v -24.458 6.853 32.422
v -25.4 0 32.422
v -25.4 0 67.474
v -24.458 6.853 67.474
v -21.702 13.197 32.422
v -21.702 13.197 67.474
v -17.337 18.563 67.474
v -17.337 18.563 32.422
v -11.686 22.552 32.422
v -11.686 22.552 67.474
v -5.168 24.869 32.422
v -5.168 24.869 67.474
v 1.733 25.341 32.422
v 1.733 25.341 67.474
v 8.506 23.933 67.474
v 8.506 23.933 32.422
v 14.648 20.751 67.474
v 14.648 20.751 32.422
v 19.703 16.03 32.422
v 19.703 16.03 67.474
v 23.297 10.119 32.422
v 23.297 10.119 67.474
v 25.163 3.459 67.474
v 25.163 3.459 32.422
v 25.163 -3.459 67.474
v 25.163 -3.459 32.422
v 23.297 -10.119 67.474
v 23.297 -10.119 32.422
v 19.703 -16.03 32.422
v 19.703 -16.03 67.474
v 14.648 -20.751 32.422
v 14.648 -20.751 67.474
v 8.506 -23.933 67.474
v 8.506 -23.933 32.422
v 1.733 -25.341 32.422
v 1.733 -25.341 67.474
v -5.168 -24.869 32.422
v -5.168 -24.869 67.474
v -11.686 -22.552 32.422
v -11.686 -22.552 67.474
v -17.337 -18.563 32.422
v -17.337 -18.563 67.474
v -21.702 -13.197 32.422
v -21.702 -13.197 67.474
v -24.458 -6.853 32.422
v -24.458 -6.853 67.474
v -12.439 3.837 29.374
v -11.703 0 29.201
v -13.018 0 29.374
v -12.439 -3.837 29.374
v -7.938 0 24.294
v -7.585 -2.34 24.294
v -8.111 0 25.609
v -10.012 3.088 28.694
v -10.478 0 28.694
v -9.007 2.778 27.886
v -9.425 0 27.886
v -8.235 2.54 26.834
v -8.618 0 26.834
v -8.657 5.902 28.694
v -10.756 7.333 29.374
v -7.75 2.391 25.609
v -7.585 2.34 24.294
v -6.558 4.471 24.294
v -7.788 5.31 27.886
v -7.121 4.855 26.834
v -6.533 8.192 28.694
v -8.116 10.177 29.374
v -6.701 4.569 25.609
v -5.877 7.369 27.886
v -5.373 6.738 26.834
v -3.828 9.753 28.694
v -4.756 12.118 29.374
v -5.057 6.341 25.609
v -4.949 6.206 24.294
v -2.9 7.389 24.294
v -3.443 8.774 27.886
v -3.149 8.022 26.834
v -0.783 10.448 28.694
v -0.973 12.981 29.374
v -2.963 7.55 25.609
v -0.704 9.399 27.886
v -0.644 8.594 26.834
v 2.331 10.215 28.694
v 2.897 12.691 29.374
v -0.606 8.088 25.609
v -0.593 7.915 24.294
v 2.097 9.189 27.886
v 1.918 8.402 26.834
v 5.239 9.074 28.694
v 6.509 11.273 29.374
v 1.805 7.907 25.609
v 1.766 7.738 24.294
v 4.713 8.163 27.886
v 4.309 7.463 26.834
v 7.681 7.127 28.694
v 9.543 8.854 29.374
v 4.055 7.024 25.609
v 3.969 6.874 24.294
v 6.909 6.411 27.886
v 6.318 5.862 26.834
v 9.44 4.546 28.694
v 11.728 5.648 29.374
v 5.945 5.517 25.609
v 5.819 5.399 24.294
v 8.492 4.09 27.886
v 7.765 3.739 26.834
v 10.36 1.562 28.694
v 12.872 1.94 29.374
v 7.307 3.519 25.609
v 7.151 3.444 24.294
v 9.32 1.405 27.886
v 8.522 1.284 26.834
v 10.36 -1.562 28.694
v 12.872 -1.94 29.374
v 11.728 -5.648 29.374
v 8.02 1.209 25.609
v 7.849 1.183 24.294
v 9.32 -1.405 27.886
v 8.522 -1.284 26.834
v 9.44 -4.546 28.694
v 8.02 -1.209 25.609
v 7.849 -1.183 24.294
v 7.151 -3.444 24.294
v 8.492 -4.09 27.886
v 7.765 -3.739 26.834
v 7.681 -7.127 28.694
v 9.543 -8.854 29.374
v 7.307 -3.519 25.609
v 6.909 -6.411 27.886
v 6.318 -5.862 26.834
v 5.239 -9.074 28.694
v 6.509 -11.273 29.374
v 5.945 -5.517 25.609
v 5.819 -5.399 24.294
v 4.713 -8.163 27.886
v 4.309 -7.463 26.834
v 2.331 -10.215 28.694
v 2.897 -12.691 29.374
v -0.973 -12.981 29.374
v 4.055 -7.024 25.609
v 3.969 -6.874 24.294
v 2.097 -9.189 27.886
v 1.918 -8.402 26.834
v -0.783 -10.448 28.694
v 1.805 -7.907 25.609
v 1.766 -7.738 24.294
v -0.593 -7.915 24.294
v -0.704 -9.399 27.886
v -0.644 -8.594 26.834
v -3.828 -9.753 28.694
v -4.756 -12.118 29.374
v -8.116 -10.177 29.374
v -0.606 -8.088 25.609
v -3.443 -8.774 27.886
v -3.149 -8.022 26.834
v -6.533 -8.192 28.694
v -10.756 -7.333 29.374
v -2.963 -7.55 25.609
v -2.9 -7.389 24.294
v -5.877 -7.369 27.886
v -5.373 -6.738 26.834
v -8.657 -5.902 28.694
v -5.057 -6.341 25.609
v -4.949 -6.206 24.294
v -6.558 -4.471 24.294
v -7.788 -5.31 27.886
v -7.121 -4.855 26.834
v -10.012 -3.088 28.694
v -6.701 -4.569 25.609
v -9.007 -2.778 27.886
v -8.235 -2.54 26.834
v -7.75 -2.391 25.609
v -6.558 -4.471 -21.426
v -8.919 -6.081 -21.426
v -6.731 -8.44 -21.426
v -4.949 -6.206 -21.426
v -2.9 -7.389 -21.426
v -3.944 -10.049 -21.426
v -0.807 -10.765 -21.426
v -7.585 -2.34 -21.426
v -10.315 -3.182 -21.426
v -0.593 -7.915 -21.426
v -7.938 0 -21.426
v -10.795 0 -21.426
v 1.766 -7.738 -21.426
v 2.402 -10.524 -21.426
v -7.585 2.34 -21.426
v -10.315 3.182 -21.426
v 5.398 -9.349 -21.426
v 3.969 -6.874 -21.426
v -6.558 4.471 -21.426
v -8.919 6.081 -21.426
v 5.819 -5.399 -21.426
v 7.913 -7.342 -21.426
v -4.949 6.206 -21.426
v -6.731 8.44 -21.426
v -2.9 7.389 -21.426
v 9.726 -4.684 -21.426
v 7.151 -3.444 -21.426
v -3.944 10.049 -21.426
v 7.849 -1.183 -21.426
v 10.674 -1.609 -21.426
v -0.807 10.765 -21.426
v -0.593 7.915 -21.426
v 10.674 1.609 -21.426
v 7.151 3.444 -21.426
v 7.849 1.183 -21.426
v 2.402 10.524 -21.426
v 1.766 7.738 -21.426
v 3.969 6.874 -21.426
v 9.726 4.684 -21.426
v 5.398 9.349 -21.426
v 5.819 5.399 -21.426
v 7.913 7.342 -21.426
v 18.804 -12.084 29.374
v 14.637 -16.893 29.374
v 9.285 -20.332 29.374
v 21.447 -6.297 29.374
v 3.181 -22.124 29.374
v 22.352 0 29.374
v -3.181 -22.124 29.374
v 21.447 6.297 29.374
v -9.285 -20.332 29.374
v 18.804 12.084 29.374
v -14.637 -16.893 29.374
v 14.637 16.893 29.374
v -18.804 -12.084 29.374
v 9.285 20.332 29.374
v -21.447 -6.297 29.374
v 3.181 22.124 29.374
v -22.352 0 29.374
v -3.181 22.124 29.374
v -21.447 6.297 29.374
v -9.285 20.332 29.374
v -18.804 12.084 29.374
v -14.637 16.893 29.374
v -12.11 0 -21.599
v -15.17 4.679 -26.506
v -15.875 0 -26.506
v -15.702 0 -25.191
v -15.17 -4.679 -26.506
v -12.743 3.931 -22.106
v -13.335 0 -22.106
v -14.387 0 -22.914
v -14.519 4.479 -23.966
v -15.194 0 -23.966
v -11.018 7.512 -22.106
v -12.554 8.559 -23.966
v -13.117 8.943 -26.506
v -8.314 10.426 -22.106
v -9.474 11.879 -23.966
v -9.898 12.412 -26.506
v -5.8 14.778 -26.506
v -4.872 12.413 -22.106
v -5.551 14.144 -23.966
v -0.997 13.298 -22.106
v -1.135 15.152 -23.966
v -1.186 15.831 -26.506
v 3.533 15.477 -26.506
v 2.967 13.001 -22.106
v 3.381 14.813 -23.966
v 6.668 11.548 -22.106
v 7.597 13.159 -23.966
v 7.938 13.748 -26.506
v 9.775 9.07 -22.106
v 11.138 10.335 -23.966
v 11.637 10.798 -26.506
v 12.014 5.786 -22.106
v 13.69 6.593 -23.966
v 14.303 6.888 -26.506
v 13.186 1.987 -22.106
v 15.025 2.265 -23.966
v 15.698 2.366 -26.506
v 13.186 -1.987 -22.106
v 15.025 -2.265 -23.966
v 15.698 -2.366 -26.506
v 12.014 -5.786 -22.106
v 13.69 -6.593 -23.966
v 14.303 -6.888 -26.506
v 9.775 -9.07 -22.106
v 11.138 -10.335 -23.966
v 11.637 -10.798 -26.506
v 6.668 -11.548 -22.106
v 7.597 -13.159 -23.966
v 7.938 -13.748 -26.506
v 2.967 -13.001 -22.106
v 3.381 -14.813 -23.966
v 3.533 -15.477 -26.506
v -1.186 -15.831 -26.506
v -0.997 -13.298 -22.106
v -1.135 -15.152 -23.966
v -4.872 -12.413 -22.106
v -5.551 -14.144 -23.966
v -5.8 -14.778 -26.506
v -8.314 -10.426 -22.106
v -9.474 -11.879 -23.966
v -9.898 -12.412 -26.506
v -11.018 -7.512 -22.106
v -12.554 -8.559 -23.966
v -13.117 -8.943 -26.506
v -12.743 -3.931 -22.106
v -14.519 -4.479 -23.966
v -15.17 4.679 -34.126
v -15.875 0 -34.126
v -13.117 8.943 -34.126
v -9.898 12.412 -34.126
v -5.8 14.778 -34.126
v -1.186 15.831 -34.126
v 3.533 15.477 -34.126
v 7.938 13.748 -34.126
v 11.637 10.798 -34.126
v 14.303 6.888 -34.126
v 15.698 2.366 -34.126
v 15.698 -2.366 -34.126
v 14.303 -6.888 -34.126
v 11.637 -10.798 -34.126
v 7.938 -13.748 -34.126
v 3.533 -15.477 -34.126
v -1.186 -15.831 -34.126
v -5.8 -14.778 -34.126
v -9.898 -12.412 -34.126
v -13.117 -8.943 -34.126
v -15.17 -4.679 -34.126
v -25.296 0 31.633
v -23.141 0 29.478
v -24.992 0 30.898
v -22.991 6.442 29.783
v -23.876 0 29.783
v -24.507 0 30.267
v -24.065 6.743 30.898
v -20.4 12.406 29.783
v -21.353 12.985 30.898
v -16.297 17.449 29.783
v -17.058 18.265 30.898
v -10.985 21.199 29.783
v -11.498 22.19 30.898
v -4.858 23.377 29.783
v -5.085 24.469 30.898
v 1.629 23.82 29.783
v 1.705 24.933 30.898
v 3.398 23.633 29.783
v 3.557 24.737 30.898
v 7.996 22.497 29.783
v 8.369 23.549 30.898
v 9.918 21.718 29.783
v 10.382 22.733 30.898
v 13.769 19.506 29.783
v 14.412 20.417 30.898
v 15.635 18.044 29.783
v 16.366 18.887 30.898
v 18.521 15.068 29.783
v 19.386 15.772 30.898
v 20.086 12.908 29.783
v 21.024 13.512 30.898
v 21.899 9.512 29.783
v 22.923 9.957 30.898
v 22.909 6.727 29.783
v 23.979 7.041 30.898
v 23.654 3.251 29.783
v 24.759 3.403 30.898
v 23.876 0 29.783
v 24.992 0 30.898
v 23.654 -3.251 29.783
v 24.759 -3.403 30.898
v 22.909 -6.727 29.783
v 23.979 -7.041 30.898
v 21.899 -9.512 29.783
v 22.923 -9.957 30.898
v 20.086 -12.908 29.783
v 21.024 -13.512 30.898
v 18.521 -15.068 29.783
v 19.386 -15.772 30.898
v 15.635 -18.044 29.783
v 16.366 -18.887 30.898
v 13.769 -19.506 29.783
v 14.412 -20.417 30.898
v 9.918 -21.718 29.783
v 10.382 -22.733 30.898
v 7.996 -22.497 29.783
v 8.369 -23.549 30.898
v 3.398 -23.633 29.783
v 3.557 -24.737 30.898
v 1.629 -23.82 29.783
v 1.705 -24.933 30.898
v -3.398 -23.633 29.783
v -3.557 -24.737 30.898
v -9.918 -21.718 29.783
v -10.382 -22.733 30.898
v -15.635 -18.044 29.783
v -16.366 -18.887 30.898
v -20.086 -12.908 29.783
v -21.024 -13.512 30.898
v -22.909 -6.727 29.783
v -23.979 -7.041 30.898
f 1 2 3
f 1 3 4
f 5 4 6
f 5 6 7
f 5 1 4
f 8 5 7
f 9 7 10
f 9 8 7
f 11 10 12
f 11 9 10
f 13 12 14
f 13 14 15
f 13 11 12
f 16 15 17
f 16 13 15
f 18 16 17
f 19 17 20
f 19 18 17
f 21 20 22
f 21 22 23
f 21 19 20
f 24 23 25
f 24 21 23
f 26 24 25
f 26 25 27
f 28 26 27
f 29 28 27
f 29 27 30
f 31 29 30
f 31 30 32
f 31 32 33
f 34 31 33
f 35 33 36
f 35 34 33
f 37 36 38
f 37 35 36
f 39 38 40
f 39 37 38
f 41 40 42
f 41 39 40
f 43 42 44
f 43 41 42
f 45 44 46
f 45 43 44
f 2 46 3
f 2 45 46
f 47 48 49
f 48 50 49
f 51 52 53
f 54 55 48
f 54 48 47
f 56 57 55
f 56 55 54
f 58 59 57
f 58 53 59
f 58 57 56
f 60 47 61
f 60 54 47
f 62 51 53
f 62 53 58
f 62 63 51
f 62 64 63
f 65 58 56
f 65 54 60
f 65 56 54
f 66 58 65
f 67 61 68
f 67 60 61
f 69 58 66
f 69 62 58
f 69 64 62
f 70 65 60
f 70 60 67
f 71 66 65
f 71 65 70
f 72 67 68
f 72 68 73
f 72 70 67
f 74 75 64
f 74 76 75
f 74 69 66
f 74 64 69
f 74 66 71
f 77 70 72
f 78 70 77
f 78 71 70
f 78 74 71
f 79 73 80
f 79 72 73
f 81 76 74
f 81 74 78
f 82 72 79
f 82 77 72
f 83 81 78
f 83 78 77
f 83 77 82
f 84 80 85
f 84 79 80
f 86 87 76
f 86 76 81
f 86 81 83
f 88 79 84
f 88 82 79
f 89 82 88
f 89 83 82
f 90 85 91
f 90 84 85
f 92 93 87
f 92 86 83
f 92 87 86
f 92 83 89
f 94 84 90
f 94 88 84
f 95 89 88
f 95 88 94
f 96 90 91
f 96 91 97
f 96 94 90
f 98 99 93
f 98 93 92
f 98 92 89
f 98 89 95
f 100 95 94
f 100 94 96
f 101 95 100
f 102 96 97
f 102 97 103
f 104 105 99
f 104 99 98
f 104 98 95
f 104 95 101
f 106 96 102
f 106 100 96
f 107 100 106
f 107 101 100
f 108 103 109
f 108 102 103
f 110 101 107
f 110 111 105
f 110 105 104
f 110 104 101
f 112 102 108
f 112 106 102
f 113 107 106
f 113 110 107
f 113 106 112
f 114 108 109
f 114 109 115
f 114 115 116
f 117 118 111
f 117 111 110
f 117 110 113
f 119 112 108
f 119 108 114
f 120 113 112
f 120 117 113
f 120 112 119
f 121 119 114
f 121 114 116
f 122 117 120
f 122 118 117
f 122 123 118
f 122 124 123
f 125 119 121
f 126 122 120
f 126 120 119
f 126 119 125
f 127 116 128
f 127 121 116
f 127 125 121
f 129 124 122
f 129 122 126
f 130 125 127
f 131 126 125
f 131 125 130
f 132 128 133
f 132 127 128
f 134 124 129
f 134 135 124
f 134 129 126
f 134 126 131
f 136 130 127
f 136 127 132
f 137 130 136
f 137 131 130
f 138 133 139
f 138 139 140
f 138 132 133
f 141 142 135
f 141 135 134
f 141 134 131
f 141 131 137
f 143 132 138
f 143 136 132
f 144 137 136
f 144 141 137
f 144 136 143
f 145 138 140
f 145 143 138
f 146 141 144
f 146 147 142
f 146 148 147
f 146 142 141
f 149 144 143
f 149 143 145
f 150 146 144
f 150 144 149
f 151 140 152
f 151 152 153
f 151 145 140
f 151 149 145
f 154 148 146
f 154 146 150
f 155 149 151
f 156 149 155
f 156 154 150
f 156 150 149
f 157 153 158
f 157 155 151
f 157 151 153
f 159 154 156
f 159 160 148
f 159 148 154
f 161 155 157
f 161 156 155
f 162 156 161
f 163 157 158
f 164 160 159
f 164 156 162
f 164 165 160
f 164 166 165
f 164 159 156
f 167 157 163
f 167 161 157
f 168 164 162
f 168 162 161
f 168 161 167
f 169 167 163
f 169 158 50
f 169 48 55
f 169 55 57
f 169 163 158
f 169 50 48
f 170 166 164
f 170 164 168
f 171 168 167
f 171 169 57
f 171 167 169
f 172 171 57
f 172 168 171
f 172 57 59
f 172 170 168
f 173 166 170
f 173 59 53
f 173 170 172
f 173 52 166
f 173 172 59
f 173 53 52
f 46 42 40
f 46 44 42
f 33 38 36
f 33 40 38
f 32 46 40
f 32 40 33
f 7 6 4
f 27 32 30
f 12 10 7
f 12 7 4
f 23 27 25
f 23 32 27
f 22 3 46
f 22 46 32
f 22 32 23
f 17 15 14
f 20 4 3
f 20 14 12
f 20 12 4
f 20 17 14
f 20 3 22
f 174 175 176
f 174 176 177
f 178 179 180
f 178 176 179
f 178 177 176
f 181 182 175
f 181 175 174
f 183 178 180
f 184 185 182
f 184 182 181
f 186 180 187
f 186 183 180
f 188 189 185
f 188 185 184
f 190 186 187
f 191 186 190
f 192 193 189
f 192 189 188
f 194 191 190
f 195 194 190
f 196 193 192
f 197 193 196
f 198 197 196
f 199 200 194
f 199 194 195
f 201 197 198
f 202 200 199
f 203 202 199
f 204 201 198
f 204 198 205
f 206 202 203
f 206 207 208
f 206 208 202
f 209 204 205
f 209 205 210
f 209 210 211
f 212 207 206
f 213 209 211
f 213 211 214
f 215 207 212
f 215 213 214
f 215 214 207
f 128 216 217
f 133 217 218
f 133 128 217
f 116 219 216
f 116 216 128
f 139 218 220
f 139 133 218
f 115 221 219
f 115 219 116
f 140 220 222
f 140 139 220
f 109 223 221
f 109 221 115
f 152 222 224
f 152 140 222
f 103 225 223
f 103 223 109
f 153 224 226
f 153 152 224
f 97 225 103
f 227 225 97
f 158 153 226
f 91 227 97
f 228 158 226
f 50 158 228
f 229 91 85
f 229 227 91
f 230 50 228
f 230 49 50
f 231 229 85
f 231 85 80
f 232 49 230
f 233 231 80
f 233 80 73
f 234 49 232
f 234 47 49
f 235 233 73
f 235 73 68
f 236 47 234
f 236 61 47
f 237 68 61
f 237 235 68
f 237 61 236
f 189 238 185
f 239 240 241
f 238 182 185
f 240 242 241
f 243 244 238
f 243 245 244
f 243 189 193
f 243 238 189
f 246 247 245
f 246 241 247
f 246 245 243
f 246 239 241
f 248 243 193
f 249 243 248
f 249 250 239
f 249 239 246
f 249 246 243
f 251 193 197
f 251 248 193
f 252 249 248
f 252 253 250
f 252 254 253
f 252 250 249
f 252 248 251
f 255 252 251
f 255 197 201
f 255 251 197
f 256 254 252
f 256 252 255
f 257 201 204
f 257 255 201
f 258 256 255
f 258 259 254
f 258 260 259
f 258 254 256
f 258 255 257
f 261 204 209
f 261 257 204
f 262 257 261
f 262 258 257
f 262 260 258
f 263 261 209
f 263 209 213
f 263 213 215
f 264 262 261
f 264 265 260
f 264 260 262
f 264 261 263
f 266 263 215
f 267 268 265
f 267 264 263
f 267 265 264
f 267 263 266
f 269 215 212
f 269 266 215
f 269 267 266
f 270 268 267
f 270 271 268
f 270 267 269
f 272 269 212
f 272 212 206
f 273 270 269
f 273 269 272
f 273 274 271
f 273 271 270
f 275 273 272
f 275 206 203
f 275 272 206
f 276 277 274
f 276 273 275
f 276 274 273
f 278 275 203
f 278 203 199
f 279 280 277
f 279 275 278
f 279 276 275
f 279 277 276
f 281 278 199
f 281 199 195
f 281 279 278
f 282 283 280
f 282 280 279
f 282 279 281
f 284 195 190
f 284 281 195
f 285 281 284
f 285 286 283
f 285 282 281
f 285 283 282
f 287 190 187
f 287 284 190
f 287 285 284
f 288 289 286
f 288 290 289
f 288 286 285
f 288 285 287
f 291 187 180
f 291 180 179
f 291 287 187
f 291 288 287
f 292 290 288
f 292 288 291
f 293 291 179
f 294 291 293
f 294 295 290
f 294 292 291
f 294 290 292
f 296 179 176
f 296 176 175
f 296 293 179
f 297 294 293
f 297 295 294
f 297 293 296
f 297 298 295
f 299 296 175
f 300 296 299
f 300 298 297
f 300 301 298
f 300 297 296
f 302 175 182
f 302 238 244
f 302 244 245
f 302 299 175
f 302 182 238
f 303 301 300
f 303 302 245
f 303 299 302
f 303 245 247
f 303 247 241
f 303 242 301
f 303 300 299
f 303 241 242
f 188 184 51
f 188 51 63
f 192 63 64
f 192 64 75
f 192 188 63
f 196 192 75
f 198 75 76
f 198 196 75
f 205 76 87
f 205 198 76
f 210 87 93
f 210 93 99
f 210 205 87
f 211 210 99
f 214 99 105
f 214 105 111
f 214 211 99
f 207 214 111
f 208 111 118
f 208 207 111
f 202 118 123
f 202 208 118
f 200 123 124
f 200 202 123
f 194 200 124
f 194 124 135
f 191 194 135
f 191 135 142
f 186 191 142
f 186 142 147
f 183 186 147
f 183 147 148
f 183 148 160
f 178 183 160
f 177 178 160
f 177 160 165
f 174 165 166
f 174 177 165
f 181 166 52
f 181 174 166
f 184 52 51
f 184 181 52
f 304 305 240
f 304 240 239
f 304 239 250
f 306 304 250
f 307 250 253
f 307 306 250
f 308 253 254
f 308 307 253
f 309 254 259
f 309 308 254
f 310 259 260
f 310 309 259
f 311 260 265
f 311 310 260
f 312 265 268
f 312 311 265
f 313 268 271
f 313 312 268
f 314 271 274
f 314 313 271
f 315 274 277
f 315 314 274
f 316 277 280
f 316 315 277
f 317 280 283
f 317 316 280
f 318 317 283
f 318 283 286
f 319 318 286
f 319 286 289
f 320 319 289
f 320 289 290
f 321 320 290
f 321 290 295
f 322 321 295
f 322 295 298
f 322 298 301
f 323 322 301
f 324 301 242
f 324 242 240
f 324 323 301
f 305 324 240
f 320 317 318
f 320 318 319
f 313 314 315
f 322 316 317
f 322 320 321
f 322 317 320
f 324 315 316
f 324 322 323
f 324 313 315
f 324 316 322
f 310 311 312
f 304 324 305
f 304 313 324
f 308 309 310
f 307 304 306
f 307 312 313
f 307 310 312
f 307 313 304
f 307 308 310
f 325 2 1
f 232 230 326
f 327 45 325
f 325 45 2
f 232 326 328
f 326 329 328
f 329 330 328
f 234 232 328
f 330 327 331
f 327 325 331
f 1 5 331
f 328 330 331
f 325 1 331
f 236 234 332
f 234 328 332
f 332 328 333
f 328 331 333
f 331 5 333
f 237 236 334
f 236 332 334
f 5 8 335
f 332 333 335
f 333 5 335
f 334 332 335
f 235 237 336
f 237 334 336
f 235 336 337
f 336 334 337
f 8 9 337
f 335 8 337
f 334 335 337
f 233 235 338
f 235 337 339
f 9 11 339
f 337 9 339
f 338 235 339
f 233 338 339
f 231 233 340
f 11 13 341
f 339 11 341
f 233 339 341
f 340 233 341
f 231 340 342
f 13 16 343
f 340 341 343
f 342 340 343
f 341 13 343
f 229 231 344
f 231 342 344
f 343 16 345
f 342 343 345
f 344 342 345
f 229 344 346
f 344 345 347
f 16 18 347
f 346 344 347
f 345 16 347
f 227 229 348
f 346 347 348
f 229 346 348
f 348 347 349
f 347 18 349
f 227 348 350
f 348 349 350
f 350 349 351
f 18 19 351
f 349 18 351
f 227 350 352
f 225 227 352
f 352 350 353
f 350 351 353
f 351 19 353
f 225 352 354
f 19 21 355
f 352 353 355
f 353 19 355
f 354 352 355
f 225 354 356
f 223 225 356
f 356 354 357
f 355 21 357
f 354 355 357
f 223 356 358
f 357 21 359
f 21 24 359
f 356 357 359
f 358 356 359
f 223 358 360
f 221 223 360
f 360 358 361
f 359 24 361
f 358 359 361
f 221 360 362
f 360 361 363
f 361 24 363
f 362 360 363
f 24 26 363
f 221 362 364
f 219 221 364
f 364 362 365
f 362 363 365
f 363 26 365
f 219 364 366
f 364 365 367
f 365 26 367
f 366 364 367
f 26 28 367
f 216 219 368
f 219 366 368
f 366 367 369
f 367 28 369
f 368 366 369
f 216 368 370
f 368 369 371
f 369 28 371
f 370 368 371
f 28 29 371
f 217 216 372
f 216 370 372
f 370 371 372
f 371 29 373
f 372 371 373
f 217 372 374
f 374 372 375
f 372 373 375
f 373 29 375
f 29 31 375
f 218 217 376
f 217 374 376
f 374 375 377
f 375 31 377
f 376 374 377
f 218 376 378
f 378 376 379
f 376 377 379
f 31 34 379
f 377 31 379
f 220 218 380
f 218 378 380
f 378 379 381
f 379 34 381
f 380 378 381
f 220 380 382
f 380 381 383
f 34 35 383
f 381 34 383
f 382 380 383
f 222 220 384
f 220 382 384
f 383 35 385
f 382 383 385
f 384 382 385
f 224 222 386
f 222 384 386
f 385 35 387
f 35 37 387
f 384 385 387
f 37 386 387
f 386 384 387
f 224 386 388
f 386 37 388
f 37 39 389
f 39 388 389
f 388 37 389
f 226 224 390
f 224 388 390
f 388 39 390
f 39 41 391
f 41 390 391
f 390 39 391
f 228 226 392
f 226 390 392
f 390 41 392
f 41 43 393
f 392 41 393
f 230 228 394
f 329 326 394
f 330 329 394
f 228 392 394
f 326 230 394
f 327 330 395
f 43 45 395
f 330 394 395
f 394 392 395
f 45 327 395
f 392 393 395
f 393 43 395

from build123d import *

# Parameters (mm, degrees)
F2_R = 5.08
F3_R = 3.048


with BuildPart() as f1:
    # F0 (on Front) → F1 (revolve)
    with BuildSketch(Plane.XZ):
        Polygon((0, -34.125851), (0, 67.474149), (-25.4, 67.474149), (-25.4, 29.374149), (-7.9375, 29.374149), (-7.9375, -21.425851), (-15.875, -21.425851), (-15.875, -34.125851), align=None)
    revolve(axis=Axis((0, 0, 9.330612), (0, 0, -1)))

    # F2
    f2_edges = [f1.edges().sort_by_distance(p)[0] for p in [
        (7.9375, 0, 29.374149),
        (15.875, 0, -21.425851),
    ]]
    fillet(f2_edges, radius=F2_R)

    # F3
    f3_edges = [f1.edges().sort_by_distance(p)[0] for p in [
        (25.4, 0, 29.374149),
    ]]
    fillet(f3_edges, radius=F3_R)


solid = f1.part
